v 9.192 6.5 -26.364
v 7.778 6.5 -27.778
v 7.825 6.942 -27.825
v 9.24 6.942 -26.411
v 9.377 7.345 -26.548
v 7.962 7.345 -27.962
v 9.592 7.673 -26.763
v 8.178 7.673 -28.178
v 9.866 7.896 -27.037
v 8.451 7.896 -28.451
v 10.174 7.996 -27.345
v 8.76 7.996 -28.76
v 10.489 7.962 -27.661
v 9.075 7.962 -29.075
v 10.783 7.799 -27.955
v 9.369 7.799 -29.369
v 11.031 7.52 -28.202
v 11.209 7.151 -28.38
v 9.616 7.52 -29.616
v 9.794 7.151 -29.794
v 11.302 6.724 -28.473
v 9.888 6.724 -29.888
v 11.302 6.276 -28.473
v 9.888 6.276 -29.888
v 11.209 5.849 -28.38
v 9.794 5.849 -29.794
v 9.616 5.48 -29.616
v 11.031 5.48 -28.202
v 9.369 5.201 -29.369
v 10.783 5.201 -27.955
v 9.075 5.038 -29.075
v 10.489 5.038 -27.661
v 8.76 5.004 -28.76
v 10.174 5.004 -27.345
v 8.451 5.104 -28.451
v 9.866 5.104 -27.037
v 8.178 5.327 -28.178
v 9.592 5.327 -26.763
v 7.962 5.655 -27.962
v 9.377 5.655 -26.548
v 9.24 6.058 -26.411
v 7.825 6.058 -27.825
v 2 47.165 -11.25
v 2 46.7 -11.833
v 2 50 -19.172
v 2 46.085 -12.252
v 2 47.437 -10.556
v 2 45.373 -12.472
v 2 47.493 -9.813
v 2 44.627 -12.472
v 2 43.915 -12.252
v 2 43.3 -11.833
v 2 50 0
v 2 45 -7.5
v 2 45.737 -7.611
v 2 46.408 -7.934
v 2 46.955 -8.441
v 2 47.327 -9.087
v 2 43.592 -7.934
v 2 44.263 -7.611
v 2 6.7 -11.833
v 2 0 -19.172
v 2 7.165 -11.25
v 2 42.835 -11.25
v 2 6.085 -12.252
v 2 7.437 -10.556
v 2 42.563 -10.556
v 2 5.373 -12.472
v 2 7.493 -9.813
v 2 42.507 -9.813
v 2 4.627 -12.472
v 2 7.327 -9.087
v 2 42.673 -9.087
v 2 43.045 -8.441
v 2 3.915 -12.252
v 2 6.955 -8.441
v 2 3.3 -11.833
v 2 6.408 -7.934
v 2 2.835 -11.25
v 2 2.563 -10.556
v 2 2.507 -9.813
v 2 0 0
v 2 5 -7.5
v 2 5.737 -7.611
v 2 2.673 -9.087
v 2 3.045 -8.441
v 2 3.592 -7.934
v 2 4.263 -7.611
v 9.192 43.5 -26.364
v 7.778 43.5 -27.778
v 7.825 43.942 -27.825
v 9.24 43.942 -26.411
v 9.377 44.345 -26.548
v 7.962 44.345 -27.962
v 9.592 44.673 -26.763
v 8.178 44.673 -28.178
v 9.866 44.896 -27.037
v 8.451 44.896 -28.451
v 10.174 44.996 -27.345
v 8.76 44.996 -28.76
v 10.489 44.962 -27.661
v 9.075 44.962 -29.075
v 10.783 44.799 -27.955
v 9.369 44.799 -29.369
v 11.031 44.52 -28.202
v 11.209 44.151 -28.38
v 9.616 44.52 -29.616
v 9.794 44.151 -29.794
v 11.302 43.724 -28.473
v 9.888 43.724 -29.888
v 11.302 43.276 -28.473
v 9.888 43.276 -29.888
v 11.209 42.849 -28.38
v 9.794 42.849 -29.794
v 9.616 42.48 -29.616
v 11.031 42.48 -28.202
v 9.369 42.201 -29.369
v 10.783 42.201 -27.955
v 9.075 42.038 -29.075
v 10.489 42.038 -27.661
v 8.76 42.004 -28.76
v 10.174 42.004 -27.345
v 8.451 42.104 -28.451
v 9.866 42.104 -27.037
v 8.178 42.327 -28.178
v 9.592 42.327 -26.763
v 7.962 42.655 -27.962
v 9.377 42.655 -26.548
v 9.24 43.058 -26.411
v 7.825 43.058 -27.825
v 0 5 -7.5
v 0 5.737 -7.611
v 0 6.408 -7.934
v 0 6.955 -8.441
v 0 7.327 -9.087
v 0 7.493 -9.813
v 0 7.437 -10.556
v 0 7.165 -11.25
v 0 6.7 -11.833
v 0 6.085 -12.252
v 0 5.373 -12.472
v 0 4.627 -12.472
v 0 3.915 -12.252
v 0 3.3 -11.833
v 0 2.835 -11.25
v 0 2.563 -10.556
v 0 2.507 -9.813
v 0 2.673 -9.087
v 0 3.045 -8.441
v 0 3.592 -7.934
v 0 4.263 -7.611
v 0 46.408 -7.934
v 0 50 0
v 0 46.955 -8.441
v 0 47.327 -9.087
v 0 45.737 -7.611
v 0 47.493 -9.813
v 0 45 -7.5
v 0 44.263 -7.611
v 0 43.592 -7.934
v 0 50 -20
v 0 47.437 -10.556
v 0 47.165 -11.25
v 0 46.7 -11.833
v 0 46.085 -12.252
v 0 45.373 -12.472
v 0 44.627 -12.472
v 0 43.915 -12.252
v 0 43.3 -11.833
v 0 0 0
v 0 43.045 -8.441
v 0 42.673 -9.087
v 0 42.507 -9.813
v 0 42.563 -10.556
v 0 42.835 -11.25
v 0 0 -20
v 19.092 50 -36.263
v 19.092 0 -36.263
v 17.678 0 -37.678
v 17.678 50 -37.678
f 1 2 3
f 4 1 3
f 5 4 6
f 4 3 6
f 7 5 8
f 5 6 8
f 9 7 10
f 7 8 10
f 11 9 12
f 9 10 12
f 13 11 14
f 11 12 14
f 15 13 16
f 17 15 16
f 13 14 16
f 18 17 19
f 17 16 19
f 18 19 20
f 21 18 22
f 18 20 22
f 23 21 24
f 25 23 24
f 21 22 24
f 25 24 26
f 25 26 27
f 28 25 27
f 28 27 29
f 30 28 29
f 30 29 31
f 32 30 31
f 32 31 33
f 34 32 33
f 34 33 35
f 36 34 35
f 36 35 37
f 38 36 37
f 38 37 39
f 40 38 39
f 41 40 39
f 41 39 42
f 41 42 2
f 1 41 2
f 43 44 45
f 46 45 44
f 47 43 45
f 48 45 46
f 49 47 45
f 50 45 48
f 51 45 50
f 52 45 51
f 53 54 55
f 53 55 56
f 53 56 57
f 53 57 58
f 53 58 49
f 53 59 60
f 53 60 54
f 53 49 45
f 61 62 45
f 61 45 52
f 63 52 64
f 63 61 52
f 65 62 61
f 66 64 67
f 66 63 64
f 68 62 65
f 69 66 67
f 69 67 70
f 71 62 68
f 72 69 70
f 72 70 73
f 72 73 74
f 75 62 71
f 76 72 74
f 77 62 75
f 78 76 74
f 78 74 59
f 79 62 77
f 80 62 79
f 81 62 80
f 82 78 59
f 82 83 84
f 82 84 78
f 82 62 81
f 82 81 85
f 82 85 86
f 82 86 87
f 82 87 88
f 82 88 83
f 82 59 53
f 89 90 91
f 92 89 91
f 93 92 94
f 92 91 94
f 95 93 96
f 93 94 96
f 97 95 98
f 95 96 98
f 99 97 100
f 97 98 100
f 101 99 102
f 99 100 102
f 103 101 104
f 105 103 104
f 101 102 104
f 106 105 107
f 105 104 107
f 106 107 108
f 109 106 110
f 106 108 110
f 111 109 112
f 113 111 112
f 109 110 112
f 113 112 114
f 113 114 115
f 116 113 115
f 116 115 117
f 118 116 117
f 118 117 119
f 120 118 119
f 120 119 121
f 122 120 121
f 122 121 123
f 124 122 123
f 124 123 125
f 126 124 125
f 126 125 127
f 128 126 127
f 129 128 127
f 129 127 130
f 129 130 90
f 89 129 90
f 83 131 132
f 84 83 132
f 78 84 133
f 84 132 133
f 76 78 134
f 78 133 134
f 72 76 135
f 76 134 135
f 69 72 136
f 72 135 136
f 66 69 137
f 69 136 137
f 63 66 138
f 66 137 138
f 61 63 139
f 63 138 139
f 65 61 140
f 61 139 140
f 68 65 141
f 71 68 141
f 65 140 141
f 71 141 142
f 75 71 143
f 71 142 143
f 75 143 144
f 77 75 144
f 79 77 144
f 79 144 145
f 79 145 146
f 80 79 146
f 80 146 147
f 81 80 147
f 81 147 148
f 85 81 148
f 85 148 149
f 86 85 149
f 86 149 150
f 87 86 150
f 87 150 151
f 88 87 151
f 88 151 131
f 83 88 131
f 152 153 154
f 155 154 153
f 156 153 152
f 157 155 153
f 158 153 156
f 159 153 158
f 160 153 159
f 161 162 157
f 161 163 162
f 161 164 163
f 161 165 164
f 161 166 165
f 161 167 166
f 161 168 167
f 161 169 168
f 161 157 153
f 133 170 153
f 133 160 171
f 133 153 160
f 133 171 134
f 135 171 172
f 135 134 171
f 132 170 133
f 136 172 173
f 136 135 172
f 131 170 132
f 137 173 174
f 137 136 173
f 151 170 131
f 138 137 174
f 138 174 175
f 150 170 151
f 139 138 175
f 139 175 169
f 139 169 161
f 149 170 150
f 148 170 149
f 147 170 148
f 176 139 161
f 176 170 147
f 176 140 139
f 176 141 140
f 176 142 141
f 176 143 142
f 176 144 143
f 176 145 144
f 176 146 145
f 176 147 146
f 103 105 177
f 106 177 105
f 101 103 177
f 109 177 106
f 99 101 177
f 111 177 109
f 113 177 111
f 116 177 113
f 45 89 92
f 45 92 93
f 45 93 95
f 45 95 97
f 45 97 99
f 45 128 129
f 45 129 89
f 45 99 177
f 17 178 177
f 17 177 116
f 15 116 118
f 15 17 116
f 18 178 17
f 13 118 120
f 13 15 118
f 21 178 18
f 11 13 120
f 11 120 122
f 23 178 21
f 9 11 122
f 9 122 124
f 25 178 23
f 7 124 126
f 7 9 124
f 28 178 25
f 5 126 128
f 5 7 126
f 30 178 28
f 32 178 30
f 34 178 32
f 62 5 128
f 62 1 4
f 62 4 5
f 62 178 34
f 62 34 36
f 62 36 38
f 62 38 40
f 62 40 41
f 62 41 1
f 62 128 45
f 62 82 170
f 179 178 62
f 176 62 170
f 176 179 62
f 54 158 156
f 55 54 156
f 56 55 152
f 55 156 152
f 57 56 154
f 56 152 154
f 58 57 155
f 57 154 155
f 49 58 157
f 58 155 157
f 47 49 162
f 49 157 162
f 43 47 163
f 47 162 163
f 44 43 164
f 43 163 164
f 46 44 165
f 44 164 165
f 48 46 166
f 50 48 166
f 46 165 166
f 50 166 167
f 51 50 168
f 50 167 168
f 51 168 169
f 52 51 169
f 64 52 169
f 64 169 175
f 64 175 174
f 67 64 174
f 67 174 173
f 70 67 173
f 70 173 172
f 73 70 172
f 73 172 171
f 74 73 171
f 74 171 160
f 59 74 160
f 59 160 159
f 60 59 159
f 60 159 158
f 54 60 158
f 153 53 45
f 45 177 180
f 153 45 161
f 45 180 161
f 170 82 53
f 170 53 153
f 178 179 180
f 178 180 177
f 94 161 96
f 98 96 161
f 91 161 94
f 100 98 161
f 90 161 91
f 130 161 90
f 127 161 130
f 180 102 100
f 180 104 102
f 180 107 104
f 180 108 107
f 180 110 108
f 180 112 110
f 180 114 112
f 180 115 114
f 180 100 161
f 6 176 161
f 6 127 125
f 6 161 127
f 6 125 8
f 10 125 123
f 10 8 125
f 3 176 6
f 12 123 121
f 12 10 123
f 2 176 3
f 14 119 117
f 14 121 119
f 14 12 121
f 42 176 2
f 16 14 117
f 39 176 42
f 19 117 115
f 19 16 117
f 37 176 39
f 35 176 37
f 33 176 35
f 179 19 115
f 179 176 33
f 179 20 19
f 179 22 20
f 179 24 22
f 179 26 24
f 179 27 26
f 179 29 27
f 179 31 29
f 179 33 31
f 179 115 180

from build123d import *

# Parameters (mm, degrees)
EXTRUSION1_DEPTH = 50
EXTRUSION2_REACH = 21.092
ESQUISSE3_R      = 2.5
EXTRUSION3_REACH = 29.642
ESQUISSE4_R      = 1.5


with BuildPart() as part:
    # Esquisse1 → Extrusion1 (new body)
    with BuildSketch(Plane(origin=(0, 0, 0), x_dir=(1, 0, 0), z_dir=(0, 1, 0))):
        Polygon((0, 0), (0, 20), (17.67766953, 37.67766953), (19.091883092, 36.263455967), (2, 19.171572875), (2, 0), align=None)
    extrude(amount=EXTRUSION1_DEPTH)

    # Esquisse3 → Extrusion2 (cut, up to next)
    with BuildSketch(Plane.ZY, mode=Mode.PRIVATE) as extrusion2_sk1:
        with Locations((-10, 5)):
            Circle(ESQUISSE3_R)
    extrusion2_tool1 = extrude(extrusion2_sk1.sketch, amount=-EXTRUSION2_REACH, mode=Mode.PRIVATE) & part.part
    add(extrusion2_tool1.solids().sort_by_distance((0, 5, -10))[0], mode=Mode.SUBTRACT)
    # Esquisse3 → Extrusion2 (cut, up to next)
    with BuildSketch(Plane.ZY, mode=Mode.PRIVATE) as extrusion2_sk2:
        with Locations((-10, 45)):
            Circle(ESQUISSE3_R)
    extrusion2_tool2 = extrude(extrusion2_sk2.sketch, amount=-EXTRUSION2_REACH, mode=Mode.PRIVATE) & part.part
    add(extrusion2_tool2.solids().sort_by_distance((0, 45, -10))[0], mode=Mode.SUBTRACT)

    # Esquisse4 → Extrusion3 (cut, up to next)
    with BuildSketch(Plane(origin=(-10, 0, -10), x_dir=(-0.707106781, 0, 0.707106781), z_dir=(-0.707106781, 0, -0.707106781)), mode=Mode.PRIVATE) as extrusion3_sk1:
        with Locations((-26.642135624, 43.5)):
            Circle(ESQUISSE4_R)
    extrusion3_tool1 = extrude(extrusion3_sk1.sketch, amount=-EXTRUSION3_REACH, mode=Mode.PRIVATE) & part.part
    add(extrusion3_tool1.solids().sort_by_distance((8.838835, 43.5, -28.838835))[0], mode=Mode.SUBTRACT)
    # Esquisse4 → Extrusion3 (cut, up to next)
    with BuildSketch(Plane(origin=(-10, 0, -10), x_dir=(-0.707106781, 0, 0.707106781), z_dir=(-0.707106781, 0, -0.707106781)), mode=Mode.PRIVATE) as extrusion3_sk2:
        with Locations((-26.642135624, 6.5)):
            Circle(ESQUISSE4_R)
    extrusion3_tool2 = extrude(extrusion3_sk2.sketch, amount=-EXTRUSION3_REACH, mode=Mode.PRIVATE) & part.part
    add(extrusion3_tool2.solids().sort_by_distance((8.838835, 6.5, -28.838835))[0], mode=Mode.SUBTRACT)


solid = part.part
